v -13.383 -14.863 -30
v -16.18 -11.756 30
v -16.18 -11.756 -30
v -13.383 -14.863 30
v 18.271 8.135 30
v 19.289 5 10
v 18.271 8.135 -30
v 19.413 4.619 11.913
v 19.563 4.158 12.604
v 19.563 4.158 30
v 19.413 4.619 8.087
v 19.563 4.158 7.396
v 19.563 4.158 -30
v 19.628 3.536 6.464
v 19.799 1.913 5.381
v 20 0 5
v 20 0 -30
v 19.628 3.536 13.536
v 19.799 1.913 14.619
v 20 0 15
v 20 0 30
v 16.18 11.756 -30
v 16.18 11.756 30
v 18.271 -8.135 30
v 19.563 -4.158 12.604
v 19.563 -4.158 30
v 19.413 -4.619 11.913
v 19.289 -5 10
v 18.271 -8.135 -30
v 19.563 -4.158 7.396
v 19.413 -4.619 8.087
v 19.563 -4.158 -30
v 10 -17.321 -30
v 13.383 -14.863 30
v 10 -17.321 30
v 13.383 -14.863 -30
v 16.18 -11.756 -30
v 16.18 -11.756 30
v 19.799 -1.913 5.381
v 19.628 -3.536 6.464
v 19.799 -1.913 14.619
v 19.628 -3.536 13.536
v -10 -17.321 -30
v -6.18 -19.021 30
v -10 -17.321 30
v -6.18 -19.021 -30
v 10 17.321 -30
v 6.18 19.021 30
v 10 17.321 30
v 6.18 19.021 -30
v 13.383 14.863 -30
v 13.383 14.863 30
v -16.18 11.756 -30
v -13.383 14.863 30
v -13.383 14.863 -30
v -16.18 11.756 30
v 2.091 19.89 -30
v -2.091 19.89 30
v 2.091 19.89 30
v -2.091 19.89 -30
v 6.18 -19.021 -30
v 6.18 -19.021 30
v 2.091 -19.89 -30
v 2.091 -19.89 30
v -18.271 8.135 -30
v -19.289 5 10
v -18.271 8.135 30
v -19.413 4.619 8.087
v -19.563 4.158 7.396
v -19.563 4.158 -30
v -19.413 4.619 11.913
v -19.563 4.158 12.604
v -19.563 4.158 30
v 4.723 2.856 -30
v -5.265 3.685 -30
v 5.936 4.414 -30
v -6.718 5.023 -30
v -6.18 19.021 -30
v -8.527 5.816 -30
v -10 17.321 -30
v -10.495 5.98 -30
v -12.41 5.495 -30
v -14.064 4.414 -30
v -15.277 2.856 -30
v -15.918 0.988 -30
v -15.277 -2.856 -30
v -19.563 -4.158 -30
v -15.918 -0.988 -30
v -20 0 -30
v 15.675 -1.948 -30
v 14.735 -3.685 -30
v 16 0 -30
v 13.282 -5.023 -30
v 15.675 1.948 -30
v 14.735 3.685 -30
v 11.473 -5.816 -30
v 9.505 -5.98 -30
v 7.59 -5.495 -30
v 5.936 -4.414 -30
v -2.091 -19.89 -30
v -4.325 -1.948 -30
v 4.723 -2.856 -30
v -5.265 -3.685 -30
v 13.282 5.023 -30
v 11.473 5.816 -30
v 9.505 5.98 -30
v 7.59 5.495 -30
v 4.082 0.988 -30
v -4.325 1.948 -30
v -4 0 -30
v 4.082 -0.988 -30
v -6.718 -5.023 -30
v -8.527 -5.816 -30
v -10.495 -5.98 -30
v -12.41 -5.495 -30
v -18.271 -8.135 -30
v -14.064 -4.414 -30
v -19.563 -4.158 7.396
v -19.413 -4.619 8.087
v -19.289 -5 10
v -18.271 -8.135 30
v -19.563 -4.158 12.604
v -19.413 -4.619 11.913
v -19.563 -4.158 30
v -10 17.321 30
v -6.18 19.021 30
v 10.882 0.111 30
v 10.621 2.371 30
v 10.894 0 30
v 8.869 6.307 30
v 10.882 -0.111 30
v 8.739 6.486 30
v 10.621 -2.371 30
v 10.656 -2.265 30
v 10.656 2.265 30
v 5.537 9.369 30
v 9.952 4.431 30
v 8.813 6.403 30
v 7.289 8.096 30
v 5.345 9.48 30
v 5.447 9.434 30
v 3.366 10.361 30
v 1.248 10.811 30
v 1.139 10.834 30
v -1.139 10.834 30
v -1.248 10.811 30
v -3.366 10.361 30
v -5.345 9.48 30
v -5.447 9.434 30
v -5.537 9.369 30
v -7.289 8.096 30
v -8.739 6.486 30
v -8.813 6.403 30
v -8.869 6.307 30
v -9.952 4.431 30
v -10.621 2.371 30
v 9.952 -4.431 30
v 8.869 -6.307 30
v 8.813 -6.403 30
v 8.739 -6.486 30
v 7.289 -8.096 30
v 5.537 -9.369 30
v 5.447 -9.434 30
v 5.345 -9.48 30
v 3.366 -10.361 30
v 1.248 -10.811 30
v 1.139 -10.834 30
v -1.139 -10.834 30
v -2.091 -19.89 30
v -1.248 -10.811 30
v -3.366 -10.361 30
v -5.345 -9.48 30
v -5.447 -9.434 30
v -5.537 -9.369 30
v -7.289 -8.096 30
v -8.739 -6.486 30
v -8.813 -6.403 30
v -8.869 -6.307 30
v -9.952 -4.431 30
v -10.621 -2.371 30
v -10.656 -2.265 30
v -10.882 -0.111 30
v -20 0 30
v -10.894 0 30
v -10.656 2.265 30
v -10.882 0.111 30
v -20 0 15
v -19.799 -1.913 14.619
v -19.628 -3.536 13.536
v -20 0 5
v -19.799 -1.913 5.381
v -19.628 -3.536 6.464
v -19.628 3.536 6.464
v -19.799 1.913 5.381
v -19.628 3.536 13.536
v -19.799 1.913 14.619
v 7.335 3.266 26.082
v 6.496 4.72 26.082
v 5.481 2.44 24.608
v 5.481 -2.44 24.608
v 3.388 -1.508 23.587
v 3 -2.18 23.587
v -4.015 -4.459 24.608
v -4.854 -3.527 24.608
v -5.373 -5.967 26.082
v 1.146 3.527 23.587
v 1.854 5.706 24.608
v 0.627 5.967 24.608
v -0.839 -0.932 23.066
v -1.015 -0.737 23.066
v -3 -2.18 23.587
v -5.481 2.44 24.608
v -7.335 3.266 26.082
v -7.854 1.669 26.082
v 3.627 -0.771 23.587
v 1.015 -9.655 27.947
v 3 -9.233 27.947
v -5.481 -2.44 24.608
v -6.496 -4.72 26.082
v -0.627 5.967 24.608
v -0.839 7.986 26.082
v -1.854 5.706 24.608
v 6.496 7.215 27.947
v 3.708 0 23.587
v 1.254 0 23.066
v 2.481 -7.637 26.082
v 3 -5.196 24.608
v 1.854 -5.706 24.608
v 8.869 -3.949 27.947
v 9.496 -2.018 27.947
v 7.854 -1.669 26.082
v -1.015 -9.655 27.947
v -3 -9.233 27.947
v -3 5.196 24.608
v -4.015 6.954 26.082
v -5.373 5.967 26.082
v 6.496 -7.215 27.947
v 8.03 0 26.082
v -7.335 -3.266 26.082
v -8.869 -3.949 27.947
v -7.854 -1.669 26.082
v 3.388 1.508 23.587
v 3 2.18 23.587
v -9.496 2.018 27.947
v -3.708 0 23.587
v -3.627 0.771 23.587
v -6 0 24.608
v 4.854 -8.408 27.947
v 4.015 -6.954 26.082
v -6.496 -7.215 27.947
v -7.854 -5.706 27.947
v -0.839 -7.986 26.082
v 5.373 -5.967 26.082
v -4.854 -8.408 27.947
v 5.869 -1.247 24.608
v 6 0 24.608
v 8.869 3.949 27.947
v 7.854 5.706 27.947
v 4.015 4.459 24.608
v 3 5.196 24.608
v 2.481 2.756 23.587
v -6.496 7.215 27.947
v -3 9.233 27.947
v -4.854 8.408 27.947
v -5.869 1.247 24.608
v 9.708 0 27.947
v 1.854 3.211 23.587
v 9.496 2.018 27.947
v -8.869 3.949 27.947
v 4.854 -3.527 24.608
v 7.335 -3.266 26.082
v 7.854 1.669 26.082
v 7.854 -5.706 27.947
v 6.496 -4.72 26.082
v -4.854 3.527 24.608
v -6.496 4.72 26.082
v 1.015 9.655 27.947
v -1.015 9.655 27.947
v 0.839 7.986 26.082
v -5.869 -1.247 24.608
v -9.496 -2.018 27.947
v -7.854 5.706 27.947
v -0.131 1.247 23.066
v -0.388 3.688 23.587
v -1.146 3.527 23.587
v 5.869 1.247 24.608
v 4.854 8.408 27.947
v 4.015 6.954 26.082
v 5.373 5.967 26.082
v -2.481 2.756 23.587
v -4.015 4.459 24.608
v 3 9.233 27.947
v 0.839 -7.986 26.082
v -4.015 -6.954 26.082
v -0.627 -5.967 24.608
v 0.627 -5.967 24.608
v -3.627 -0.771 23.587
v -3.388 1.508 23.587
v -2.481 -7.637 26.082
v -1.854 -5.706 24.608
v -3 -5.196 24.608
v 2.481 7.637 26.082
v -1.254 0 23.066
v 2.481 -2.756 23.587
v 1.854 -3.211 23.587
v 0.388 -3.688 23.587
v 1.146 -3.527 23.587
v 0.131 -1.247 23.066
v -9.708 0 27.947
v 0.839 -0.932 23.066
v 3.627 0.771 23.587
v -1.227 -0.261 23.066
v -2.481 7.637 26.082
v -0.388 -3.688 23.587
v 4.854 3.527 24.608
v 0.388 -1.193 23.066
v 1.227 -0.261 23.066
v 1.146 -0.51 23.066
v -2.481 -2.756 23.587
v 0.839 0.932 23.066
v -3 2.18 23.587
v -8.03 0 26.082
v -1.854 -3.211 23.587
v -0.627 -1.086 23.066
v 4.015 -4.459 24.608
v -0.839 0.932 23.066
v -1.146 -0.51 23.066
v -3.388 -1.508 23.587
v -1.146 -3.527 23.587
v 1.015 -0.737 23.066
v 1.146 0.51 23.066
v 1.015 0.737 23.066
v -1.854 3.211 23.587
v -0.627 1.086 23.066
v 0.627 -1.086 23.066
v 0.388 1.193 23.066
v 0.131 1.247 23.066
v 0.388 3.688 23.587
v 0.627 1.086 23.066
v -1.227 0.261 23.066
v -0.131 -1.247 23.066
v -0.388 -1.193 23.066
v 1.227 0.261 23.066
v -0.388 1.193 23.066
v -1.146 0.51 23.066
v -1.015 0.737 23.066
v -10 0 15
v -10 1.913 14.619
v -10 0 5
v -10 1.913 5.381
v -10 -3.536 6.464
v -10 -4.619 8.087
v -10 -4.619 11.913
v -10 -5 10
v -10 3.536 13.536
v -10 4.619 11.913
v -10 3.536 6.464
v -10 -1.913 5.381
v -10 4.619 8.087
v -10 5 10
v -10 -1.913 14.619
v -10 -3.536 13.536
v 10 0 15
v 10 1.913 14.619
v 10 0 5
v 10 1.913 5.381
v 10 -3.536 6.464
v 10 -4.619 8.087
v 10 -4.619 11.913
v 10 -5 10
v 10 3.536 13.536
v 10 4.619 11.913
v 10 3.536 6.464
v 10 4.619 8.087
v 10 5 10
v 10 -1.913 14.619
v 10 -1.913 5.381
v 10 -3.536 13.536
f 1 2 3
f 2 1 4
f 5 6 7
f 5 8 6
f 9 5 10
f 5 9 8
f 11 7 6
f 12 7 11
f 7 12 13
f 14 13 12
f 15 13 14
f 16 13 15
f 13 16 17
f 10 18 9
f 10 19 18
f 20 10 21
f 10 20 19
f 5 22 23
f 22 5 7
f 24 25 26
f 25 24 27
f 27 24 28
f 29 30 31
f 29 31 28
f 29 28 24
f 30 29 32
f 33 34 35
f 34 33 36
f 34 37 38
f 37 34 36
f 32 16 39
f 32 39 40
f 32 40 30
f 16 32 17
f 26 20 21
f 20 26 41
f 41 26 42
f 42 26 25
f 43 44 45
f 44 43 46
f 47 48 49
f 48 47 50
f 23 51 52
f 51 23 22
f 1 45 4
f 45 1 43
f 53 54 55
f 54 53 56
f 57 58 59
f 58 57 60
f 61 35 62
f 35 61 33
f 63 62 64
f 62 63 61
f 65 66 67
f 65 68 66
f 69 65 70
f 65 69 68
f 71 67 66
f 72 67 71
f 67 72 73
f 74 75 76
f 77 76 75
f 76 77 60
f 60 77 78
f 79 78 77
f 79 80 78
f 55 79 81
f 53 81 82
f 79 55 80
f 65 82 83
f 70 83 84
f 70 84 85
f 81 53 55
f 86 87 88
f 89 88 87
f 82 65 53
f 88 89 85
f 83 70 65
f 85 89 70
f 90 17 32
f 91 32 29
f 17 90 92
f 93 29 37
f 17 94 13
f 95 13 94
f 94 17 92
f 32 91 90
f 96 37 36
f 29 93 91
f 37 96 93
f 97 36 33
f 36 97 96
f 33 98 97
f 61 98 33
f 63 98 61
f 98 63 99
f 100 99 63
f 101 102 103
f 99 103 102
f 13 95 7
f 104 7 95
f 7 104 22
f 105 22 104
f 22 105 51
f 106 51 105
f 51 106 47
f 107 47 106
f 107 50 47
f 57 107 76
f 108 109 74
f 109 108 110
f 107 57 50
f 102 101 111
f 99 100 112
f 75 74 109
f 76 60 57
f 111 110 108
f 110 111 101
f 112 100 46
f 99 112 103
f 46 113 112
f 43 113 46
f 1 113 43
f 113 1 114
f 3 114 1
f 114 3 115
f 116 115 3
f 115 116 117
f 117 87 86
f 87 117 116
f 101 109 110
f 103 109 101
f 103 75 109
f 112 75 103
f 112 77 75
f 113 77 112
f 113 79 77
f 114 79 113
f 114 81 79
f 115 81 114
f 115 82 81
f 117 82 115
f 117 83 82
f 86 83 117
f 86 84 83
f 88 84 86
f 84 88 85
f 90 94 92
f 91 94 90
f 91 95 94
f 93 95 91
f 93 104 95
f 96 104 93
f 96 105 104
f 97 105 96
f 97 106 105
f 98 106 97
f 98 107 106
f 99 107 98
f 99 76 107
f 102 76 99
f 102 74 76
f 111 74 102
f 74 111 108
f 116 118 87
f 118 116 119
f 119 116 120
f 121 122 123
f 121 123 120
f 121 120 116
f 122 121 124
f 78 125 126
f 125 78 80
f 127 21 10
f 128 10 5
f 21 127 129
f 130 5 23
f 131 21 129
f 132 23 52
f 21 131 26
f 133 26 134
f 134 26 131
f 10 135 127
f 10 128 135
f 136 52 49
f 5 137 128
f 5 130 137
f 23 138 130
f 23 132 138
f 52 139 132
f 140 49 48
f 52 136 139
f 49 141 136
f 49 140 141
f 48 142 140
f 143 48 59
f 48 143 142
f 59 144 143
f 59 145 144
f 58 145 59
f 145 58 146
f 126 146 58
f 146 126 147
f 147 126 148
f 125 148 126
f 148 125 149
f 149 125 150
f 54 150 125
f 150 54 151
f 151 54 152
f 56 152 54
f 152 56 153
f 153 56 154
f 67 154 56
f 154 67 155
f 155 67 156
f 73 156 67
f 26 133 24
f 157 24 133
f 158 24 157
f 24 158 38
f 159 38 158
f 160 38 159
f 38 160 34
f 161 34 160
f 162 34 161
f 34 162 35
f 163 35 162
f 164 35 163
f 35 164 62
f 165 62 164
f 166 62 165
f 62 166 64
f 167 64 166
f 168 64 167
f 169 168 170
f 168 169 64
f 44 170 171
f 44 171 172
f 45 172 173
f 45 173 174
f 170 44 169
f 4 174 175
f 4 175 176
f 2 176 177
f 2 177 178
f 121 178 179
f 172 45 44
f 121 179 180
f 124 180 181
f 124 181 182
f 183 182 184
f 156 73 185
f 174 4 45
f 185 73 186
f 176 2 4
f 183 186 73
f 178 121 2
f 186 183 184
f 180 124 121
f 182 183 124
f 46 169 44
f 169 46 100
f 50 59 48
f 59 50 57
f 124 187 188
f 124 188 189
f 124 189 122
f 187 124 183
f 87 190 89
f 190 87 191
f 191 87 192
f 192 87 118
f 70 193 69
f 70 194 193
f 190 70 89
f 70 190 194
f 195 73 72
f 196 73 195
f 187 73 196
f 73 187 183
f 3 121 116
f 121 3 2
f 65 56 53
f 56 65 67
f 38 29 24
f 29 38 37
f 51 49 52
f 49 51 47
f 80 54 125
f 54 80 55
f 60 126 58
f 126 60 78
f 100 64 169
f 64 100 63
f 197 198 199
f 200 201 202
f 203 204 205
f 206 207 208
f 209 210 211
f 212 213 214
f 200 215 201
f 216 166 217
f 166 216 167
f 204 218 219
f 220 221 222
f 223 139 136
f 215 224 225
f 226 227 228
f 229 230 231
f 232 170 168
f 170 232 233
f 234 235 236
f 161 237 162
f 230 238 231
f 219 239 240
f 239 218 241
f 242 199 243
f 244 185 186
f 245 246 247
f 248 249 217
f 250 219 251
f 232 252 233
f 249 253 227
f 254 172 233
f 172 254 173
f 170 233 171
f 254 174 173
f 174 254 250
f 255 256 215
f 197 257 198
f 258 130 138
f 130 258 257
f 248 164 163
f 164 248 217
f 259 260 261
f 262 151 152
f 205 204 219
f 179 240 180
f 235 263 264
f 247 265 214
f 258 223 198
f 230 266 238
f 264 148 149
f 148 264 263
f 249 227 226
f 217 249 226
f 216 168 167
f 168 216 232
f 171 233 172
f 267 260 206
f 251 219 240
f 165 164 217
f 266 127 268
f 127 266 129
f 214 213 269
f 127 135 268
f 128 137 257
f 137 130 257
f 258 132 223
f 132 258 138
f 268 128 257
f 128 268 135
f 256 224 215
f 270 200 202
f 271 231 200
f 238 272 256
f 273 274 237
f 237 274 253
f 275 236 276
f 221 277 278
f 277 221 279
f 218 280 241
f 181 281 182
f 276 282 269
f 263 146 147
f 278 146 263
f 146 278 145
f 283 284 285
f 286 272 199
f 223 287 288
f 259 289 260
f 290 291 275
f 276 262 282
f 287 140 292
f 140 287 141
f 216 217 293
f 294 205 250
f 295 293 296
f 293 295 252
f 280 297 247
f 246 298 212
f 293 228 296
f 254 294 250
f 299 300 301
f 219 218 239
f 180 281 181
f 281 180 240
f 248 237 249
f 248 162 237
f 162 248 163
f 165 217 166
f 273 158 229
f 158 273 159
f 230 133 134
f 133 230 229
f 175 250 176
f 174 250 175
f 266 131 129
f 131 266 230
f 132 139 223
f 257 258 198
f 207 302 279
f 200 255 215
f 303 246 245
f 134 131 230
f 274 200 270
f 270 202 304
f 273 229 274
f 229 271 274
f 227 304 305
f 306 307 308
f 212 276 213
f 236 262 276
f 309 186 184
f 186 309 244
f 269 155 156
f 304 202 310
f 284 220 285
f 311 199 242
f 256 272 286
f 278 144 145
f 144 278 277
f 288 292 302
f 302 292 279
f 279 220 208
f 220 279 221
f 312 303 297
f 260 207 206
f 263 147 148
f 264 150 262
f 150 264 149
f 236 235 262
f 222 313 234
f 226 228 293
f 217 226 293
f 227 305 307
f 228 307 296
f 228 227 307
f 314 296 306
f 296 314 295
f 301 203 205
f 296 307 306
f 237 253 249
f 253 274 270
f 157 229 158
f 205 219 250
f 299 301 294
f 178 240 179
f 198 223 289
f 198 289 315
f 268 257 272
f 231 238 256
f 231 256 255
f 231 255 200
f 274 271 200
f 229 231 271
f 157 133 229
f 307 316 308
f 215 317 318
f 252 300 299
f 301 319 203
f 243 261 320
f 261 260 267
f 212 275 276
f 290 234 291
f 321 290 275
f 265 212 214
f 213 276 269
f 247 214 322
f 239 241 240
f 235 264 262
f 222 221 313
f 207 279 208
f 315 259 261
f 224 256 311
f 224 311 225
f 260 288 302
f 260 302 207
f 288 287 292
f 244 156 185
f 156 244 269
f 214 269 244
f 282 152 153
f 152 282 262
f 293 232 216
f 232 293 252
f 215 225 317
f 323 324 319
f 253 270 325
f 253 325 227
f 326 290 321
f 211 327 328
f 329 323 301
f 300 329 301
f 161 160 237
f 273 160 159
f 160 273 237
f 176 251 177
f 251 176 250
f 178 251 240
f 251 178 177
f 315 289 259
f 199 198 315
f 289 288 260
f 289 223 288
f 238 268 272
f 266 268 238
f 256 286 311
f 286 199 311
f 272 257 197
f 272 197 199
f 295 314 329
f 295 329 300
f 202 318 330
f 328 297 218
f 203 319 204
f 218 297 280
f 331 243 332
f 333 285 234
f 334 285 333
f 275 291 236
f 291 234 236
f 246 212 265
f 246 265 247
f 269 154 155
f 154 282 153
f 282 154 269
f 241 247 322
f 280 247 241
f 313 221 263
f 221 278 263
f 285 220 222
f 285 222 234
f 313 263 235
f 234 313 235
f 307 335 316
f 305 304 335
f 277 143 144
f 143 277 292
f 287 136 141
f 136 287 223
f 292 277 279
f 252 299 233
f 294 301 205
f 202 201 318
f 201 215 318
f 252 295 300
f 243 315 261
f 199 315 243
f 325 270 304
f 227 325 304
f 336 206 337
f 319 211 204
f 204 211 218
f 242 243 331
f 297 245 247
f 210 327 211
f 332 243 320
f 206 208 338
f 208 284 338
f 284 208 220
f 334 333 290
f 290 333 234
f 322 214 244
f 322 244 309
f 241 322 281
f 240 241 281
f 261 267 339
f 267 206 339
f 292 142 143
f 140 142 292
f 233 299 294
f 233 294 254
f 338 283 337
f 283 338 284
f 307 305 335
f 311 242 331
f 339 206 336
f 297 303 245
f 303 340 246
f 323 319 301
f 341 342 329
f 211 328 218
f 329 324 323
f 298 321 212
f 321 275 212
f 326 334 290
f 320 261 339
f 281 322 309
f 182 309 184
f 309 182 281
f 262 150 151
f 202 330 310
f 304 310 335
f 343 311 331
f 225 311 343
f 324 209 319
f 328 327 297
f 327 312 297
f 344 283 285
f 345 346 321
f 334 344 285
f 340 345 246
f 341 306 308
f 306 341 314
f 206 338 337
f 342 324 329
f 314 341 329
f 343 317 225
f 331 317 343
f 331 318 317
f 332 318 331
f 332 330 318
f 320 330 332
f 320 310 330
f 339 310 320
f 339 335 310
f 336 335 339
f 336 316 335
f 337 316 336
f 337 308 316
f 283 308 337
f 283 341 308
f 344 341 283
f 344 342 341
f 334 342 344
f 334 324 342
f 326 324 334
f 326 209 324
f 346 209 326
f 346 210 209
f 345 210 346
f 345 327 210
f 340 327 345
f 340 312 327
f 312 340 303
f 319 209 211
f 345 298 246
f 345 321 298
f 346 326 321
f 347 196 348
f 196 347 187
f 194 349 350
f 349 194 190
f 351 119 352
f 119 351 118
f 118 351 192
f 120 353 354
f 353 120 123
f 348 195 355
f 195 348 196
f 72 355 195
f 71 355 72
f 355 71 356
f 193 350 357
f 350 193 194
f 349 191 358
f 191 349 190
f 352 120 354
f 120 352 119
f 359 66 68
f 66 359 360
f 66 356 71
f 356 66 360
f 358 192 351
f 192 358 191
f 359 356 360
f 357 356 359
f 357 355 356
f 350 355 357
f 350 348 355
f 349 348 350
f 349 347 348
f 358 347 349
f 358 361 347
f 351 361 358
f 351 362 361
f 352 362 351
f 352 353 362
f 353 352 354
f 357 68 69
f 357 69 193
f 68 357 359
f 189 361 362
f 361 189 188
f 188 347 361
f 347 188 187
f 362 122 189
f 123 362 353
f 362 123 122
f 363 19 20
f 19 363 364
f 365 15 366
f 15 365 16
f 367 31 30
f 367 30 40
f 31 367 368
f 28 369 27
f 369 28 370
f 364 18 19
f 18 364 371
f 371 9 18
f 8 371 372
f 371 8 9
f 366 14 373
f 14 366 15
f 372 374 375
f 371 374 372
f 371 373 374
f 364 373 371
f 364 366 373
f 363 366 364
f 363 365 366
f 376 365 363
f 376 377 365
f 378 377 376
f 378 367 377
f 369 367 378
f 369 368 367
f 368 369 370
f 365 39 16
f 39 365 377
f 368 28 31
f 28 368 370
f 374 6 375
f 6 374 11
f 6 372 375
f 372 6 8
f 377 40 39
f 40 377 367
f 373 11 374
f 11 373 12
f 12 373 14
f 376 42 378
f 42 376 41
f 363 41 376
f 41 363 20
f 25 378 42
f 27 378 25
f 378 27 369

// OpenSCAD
// Simple representation of a "big guy"
module big_guy() {
    difference() {
        // Body - a large cylinder
        translate([0, 0, 0])
        cylinder(h=60, r=20, center=true);
        
        // Head - a smaller sphere
        translate([0, 0, 35])
        sphere(r=12);

        // Legs - two smaller cylinders
        translate([-10, 0, -50])
        cylinder(h=40, r=6, center=true);
        
        translate([10, 0, -50])
        cylinder(h=40, r=6, center=true);

        // Arms - two medium-sized cylinders
        translate([-30, 0, 10])
        rotate([0, 90, 0])
        cylinder(h=40, r=5, center=true);
        
        translate([30, 0, 10])
        rotate([0, 90, 0])
        cylinder(h=40, r=5, center=true);
    }
}

// Call the module to render the big guy
big_guy();
